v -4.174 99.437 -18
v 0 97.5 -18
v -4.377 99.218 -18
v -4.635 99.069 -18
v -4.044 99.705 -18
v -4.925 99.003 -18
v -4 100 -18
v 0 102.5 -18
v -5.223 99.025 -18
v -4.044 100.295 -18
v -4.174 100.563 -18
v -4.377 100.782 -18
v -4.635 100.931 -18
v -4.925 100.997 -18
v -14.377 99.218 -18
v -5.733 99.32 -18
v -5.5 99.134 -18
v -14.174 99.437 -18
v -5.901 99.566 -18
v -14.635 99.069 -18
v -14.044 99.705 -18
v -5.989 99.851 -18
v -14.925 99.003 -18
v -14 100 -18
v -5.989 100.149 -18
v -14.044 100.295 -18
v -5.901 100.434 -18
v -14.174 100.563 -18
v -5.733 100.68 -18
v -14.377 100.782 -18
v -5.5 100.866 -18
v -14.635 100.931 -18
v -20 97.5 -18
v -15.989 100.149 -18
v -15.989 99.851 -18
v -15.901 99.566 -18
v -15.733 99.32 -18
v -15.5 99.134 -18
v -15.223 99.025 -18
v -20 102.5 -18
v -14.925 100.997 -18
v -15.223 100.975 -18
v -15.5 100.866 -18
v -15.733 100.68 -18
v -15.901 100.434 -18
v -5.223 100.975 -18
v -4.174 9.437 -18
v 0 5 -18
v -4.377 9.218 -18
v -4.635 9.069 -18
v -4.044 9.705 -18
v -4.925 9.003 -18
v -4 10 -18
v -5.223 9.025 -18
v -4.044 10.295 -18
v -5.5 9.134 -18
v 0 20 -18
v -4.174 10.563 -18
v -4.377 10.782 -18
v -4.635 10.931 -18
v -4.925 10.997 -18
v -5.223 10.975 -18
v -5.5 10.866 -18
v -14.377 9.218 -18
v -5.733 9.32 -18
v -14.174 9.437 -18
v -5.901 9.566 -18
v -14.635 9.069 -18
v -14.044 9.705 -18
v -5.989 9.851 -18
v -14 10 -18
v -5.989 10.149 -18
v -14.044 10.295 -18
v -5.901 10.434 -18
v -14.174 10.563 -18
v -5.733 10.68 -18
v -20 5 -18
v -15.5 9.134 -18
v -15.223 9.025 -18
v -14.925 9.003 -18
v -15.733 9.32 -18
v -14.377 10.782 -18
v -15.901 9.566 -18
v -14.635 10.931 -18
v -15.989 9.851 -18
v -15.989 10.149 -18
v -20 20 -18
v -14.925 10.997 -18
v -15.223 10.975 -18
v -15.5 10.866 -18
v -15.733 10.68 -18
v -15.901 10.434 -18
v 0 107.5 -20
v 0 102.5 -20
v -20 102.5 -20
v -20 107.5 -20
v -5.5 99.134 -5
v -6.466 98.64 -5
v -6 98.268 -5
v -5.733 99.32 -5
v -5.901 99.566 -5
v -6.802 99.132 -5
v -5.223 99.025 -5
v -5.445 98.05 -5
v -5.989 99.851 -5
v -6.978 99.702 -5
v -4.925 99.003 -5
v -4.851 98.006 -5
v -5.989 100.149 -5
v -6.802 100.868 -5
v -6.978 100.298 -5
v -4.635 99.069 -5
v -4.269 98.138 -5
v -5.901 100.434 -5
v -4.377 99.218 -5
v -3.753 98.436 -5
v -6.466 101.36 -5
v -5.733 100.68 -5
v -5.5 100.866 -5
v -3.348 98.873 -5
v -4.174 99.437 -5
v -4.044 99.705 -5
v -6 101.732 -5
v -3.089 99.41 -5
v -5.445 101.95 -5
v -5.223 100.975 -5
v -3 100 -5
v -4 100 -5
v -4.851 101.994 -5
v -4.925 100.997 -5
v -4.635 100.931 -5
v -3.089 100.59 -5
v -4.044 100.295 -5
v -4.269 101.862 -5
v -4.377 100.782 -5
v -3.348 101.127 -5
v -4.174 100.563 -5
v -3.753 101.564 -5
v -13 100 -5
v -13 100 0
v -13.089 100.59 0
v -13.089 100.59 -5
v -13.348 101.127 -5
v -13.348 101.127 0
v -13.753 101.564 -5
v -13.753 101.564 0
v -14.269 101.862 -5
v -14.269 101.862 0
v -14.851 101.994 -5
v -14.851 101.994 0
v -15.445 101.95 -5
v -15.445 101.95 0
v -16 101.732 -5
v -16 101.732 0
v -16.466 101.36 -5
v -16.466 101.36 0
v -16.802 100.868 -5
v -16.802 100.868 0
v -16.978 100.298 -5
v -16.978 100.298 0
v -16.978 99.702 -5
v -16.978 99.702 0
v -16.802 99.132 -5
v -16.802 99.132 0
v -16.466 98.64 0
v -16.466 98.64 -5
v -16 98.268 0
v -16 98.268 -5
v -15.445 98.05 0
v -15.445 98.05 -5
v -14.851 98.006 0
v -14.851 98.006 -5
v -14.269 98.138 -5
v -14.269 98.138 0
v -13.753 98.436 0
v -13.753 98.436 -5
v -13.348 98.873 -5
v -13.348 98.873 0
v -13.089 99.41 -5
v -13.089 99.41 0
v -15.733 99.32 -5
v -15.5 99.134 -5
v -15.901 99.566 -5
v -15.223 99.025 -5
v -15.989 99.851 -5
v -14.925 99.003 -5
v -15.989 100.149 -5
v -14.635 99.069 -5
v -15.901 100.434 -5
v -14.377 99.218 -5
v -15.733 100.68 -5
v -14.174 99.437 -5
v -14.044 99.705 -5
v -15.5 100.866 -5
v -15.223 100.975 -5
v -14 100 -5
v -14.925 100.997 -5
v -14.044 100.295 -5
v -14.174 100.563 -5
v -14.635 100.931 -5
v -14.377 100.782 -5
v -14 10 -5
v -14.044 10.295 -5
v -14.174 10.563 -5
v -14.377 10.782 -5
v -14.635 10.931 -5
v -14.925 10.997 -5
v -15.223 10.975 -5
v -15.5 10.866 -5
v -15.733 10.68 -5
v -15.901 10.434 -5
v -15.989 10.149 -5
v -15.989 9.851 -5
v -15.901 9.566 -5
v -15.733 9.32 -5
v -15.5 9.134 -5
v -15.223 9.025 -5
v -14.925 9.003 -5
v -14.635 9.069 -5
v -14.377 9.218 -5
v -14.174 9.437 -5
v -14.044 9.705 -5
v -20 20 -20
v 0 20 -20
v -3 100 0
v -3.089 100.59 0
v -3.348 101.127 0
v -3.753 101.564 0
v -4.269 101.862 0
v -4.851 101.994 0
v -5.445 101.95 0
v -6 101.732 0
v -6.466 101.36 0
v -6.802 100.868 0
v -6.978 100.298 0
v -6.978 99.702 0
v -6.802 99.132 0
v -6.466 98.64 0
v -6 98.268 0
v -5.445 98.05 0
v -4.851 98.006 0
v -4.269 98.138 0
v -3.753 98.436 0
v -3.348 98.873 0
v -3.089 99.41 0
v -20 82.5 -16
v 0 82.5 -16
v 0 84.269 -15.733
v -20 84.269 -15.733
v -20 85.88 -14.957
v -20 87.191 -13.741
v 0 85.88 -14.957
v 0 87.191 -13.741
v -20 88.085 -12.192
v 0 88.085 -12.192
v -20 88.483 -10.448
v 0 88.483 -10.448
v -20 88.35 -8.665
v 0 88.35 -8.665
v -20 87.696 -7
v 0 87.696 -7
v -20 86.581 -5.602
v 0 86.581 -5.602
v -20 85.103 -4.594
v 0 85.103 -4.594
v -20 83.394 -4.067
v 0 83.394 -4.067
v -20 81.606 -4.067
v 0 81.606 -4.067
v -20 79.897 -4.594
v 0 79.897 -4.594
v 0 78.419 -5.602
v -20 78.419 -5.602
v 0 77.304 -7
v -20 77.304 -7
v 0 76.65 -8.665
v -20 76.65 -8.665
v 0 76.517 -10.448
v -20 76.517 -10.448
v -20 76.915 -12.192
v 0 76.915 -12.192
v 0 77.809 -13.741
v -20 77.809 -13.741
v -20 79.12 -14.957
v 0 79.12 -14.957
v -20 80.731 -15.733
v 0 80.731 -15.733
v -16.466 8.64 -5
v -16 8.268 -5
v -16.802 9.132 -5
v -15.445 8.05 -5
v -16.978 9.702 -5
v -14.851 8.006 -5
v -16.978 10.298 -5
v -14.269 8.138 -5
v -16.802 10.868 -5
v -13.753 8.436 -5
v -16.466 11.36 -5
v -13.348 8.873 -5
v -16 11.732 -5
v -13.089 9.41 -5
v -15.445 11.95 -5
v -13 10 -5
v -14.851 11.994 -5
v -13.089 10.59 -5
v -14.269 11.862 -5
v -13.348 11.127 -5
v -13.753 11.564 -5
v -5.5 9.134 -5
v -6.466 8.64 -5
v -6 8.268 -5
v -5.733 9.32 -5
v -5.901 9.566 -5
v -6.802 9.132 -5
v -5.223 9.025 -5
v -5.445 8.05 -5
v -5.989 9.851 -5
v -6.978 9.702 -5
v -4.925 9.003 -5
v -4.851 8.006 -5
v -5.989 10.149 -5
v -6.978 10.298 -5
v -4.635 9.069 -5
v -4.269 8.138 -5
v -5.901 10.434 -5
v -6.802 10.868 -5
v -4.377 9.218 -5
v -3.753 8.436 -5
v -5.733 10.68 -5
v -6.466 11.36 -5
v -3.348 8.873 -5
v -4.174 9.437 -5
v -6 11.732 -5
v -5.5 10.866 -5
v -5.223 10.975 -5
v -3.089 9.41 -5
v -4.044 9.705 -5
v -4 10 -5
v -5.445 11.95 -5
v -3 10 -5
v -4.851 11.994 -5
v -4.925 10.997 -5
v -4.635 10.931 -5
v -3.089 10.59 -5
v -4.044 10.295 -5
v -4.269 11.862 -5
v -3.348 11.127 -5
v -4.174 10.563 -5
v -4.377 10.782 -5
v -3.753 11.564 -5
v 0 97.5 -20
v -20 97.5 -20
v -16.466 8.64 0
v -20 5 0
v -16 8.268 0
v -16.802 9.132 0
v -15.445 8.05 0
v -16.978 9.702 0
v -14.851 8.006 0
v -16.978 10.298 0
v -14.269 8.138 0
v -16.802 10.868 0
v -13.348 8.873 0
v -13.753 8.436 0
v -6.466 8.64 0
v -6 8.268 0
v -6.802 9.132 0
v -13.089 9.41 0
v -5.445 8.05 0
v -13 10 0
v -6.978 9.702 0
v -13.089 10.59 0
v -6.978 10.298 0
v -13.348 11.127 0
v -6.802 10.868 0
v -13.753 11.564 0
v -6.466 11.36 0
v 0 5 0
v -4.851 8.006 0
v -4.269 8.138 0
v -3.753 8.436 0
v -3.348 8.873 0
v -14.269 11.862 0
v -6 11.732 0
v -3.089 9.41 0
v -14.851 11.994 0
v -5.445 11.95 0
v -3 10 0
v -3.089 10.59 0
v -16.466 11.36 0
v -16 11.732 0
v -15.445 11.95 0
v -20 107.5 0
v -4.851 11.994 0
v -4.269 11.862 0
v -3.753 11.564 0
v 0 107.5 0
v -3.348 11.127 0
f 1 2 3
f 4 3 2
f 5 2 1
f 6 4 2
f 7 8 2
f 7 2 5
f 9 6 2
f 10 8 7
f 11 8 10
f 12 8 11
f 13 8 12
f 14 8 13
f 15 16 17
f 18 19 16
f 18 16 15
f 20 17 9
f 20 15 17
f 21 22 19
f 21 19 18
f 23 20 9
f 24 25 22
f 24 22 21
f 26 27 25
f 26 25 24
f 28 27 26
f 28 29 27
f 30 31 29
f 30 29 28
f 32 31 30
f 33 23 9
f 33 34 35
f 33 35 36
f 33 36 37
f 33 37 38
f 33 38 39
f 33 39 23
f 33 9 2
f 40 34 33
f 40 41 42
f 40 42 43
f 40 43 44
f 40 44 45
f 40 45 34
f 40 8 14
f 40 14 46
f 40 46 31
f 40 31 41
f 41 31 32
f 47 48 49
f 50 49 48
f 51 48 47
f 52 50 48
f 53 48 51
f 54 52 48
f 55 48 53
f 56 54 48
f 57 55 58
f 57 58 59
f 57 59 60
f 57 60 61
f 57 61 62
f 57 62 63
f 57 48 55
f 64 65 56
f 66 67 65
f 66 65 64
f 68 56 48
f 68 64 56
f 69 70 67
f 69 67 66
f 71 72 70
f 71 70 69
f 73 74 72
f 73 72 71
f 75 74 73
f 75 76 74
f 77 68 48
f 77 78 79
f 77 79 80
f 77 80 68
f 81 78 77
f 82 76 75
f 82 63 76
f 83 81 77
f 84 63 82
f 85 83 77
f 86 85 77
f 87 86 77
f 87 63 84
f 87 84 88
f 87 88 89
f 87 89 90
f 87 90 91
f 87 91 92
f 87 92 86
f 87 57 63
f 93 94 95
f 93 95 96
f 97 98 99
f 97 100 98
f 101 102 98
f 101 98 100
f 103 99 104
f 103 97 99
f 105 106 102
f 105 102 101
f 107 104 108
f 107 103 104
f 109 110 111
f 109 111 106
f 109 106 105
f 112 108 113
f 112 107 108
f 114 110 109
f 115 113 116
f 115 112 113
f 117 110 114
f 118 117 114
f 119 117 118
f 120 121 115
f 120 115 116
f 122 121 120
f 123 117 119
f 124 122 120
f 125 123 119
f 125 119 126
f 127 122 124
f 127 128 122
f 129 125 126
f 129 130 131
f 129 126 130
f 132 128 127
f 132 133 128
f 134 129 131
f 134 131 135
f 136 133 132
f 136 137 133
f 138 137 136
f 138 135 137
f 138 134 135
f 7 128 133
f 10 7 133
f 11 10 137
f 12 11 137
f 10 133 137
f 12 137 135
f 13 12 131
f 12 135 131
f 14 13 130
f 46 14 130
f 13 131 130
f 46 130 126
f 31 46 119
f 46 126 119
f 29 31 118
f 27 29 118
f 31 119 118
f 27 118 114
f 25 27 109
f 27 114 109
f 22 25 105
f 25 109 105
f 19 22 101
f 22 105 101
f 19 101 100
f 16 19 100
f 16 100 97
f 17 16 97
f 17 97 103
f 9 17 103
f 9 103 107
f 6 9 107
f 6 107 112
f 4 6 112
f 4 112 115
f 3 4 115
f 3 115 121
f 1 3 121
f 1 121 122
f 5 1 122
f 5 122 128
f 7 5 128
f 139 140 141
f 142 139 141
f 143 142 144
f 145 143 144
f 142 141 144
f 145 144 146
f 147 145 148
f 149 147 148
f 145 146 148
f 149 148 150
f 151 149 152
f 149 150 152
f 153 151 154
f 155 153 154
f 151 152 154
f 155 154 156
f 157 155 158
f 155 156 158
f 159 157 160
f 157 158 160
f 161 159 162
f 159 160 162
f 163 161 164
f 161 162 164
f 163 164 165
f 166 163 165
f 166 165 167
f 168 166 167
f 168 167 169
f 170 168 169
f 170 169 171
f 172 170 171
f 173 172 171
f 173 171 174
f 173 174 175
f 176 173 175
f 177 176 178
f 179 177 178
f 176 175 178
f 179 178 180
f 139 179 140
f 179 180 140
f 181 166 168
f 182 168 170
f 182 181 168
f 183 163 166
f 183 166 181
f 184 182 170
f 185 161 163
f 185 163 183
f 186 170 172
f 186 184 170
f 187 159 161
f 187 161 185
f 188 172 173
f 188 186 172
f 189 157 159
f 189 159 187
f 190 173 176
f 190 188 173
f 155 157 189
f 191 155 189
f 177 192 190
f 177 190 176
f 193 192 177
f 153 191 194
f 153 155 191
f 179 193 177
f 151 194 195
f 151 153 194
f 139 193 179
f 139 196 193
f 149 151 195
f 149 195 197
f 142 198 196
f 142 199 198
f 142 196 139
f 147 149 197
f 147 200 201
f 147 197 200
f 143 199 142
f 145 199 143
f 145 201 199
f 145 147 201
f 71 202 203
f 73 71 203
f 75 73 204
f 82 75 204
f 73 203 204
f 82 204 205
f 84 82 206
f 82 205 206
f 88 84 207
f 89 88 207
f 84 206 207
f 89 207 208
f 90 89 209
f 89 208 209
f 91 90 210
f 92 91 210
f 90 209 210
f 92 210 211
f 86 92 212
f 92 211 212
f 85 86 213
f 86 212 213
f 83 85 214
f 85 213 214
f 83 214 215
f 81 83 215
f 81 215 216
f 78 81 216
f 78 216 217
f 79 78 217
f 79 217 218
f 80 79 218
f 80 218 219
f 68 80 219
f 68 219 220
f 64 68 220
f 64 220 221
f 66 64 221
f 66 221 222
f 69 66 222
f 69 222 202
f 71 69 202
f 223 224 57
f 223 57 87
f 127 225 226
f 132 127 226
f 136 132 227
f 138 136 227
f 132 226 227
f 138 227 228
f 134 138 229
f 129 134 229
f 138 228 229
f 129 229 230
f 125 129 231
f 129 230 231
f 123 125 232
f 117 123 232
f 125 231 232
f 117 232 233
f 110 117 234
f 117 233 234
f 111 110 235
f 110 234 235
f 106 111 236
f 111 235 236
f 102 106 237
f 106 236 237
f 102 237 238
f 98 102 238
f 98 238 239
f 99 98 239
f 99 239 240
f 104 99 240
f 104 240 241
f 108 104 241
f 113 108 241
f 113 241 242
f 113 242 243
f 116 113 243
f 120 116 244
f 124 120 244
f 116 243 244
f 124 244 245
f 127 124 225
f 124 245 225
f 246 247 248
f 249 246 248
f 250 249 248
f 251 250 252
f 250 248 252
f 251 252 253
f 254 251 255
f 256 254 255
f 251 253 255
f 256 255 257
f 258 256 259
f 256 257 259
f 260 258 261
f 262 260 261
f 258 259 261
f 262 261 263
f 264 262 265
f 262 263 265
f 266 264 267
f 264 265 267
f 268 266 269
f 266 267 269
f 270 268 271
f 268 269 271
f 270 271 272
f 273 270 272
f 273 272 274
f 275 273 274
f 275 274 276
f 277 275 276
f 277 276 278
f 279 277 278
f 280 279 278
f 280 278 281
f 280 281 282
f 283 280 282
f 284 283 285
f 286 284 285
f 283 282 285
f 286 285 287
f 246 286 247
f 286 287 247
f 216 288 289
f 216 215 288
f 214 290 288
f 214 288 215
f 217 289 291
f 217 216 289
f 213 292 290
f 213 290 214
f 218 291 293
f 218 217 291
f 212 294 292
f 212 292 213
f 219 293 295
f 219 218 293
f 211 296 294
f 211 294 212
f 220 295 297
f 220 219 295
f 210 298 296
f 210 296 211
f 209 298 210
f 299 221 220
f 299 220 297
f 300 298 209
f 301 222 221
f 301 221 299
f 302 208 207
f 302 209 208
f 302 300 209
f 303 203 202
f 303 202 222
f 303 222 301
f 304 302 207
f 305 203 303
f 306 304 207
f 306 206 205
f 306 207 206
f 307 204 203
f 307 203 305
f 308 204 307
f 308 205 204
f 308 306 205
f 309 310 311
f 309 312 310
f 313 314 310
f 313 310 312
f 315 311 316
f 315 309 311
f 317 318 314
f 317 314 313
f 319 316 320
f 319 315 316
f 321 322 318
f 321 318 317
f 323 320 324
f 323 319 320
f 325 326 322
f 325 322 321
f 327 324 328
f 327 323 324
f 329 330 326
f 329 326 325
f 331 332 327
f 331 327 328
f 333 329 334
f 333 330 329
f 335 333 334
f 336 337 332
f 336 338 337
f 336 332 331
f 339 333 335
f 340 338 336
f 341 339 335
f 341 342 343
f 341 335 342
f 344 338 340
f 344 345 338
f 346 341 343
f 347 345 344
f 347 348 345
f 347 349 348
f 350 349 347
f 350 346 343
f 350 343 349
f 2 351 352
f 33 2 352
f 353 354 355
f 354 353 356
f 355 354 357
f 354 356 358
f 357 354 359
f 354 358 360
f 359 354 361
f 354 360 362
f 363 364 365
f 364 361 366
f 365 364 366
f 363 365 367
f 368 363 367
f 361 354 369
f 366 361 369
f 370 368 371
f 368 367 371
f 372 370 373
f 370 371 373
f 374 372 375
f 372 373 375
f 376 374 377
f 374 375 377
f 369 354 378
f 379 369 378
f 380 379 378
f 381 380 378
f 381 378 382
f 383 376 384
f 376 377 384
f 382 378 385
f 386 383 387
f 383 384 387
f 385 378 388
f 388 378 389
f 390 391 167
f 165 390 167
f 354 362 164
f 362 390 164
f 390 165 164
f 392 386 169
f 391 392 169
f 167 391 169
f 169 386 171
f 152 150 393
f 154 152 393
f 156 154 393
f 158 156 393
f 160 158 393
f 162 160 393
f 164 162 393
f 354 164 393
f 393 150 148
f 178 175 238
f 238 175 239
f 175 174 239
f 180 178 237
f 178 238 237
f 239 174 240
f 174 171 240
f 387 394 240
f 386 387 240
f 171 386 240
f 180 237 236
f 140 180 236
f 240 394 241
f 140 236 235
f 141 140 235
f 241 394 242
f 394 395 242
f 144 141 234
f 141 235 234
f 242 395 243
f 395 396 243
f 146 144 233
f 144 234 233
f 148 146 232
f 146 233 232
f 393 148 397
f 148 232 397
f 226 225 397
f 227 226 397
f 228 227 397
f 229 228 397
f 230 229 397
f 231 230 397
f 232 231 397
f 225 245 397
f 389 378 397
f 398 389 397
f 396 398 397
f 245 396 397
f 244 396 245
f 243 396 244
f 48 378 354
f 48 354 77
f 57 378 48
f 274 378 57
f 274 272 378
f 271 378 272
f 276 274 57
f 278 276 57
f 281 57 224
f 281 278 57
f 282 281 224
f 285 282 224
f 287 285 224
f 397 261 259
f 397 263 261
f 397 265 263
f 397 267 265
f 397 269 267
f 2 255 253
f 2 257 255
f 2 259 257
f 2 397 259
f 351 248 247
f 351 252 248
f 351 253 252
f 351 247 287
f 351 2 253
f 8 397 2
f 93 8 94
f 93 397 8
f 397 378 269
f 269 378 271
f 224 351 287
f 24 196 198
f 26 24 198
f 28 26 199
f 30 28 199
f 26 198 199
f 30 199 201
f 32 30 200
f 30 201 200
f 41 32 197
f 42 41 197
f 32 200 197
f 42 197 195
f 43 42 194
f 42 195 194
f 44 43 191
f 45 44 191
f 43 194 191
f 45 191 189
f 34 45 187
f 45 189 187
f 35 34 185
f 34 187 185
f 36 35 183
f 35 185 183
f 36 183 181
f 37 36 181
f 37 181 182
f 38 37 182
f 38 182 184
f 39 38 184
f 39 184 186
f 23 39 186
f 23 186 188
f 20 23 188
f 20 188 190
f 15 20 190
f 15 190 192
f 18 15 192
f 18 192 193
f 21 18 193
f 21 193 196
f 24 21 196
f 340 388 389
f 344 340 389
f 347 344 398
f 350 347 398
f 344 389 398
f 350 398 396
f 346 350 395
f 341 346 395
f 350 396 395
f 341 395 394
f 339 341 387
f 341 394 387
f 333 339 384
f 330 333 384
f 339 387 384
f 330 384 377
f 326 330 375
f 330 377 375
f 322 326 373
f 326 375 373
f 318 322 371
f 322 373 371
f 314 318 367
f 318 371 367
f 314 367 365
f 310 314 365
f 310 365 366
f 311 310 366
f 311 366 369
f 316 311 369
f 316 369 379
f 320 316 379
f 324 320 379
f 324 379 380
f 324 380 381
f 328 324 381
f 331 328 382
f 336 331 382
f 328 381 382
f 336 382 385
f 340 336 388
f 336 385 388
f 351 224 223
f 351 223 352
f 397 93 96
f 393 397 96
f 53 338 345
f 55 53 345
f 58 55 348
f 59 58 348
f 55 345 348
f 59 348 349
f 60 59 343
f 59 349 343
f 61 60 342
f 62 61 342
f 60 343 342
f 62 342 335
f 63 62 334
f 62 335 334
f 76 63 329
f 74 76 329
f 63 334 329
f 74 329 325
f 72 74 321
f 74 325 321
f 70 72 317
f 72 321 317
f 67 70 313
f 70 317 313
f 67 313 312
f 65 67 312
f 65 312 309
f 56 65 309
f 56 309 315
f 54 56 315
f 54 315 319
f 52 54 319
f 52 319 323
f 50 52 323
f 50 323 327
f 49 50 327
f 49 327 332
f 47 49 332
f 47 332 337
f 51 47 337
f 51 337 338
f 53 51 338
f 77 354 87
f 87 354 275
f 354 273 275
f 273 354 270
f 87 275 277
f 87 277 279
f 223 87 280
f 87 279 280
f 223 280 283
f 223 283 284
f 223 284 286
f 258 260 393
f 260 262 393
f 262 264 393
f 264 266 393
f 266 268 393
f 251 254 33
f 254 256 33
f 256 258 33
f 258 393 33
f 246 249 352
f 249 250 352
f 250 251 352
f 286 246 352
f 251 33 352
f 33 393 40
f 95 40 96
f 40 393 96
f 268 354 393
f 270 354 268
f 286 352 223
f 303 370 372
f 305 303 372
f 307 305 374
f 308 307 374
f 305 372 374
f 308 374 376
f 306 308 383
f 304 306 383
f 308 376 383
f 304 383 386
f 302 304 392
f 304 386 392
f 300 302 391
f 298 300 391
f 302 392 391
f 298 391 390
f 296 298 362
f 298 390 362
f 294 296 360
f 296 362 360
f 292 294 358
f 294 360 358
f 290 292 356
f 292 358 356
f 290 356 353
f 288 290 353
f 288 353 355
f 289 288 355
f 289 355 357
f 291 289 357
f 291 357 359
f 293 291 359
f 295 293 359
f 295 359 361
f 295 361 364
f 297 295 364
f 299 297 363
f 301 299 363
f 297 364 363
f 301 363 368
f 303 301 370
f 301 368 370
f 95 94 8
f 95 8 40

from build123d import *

# Parameters (mm, degrees)
SKETCH1_W           = 20
SKETCH1_H           = 120
SKETCH1_R           = 6
BOSS_EXTRUDE2_DEPTH = 20
SKETCH11_R          = 1
CUT_EXTRUDE2_DEPTH  = 21
SKETCH12_R          = 2
CUT_EXTRUDE3_DEPTH  = 5
SKETCH11_3_R        = 1
CUT_EXTRUDE4_DEPTH  = 21
SKETCH14_W          = 20
SKETCH14_H          = 5
SKETCH14_H_2        = 20
CUT_EXTRUDE6_DEPTH  = 2
SKETCH15_W          = 18
SKETCH15_H          = 5
CUT_EXTRUDE7_DEPTH  = 21
SKETCH16_W          = 20
SKETCH16_H          = 12.5
CUT_EXTRUDE8_DEPTH  = 21


with BuildPart() as part:
    # Sketch1 → Boss-Extrude2 (new body)
    with BuildSketch(Plane(origin=(0, 0, 0), x_dir=(0, 0, -1), z_dir=(1, 0, 0))):
        with Locations((10, 60)):
            Rectangle(SKETCH1_W, SKETCH1_H)
        with Locations((10, 82.5)):
            Circle(SKETCH1_R, mode=Mode.SUBTRACT)
    extrude(amount=-BOSS_EXTRUDE2_DEPTH)

    # Sketch11 → Cut-Extrude2 (cut, through all)
    with BuildSketch(Plane.XY):
        with Locations((-15, 10)):
            Circle(SKETCH11_R)
        with Locations((-5, 10)):
            Circle(SKETCH11_R)
    extrude(amount=-CUT_EXTRUDE2_DEPTH, mode=Mode.SUBTRACT)

    # Sketch12 → Cut-Extrude3 (cut)
    with BuildSketch(Plane.XY):
        with Locations((-15, 10)):
            Circle(SKETCH12_R)
        with Locations((-5, 10)):
            Circle(SKETCH12_R)
        with Locations((-15, 100)):
            Circle(SKETCH12_R)
        with Locations((-5, 100)):
            Circle(SKETCH12_R)
    extrude(amount=-CUT_EXTRUDE3_DEPTH, mode=Mode.SUBTRACT)

    # Sketch11<3> → Cut-Extrude4 (cut, through all)
    with BuildSketch(Plane.XY):
        with Locations((-15, 100)):
            Circle(SKETCH11_3_R)
        with Locations((-5, 100)):
            Circle(SKETCH11_3_R)
    extrude(amount=-CUT_EXTRUDE4_DEPTH, mode=Mode.SUBTRACT)

    # Sketch14 → Cut-Extrude6 (cut)
    with BuildSketch(Plane(origin=(0, 0, -20), x_dir=(-1, 0, 0), z_dir=(0, 0, -1))):
        with Locations((10, 100)):
            Rectangle(SKETCH14_W, SKETCH14_H)
        with Locations((10, 10)):
            Rectangle(SKETCH14_W, SKETCH14_H_2)
    extrude(amount=-CUT_EXTRUDE6_DEPTH, mode=Mode.SUBTRACT)

    # Sketch15 → Cut-Extrude7 (cut, through all)
    with BuildSketch(Plane(origin=(0, 0, 0), x_dir=(0, 0, -1), z_dir=(1, 0, 0))):
        with Locations((9, 2.5)):
            Rectangle(SKETCH15_W, SKETCH15_H)
    extrude(amount=-CUT_EXTRUDE7_DEPTH, mode=Mode.SUBTRACT)

    # Sketch16 → Cut-Extrude8 (cut, through all)
    with BuildSketch(Plane(origin=(0, 0, -20), x_dir=(-1, 0, 0), z_dir=(0, 0, -1))):
        with Locations((10, 113.75)):
            Rectangle(SKETCH16_W, SKETCH16_H)
    extrude(amount=-CUT_EXTRUDE8_DEPTH, mode=Mode.SUBTRACT)


solid = part.part
